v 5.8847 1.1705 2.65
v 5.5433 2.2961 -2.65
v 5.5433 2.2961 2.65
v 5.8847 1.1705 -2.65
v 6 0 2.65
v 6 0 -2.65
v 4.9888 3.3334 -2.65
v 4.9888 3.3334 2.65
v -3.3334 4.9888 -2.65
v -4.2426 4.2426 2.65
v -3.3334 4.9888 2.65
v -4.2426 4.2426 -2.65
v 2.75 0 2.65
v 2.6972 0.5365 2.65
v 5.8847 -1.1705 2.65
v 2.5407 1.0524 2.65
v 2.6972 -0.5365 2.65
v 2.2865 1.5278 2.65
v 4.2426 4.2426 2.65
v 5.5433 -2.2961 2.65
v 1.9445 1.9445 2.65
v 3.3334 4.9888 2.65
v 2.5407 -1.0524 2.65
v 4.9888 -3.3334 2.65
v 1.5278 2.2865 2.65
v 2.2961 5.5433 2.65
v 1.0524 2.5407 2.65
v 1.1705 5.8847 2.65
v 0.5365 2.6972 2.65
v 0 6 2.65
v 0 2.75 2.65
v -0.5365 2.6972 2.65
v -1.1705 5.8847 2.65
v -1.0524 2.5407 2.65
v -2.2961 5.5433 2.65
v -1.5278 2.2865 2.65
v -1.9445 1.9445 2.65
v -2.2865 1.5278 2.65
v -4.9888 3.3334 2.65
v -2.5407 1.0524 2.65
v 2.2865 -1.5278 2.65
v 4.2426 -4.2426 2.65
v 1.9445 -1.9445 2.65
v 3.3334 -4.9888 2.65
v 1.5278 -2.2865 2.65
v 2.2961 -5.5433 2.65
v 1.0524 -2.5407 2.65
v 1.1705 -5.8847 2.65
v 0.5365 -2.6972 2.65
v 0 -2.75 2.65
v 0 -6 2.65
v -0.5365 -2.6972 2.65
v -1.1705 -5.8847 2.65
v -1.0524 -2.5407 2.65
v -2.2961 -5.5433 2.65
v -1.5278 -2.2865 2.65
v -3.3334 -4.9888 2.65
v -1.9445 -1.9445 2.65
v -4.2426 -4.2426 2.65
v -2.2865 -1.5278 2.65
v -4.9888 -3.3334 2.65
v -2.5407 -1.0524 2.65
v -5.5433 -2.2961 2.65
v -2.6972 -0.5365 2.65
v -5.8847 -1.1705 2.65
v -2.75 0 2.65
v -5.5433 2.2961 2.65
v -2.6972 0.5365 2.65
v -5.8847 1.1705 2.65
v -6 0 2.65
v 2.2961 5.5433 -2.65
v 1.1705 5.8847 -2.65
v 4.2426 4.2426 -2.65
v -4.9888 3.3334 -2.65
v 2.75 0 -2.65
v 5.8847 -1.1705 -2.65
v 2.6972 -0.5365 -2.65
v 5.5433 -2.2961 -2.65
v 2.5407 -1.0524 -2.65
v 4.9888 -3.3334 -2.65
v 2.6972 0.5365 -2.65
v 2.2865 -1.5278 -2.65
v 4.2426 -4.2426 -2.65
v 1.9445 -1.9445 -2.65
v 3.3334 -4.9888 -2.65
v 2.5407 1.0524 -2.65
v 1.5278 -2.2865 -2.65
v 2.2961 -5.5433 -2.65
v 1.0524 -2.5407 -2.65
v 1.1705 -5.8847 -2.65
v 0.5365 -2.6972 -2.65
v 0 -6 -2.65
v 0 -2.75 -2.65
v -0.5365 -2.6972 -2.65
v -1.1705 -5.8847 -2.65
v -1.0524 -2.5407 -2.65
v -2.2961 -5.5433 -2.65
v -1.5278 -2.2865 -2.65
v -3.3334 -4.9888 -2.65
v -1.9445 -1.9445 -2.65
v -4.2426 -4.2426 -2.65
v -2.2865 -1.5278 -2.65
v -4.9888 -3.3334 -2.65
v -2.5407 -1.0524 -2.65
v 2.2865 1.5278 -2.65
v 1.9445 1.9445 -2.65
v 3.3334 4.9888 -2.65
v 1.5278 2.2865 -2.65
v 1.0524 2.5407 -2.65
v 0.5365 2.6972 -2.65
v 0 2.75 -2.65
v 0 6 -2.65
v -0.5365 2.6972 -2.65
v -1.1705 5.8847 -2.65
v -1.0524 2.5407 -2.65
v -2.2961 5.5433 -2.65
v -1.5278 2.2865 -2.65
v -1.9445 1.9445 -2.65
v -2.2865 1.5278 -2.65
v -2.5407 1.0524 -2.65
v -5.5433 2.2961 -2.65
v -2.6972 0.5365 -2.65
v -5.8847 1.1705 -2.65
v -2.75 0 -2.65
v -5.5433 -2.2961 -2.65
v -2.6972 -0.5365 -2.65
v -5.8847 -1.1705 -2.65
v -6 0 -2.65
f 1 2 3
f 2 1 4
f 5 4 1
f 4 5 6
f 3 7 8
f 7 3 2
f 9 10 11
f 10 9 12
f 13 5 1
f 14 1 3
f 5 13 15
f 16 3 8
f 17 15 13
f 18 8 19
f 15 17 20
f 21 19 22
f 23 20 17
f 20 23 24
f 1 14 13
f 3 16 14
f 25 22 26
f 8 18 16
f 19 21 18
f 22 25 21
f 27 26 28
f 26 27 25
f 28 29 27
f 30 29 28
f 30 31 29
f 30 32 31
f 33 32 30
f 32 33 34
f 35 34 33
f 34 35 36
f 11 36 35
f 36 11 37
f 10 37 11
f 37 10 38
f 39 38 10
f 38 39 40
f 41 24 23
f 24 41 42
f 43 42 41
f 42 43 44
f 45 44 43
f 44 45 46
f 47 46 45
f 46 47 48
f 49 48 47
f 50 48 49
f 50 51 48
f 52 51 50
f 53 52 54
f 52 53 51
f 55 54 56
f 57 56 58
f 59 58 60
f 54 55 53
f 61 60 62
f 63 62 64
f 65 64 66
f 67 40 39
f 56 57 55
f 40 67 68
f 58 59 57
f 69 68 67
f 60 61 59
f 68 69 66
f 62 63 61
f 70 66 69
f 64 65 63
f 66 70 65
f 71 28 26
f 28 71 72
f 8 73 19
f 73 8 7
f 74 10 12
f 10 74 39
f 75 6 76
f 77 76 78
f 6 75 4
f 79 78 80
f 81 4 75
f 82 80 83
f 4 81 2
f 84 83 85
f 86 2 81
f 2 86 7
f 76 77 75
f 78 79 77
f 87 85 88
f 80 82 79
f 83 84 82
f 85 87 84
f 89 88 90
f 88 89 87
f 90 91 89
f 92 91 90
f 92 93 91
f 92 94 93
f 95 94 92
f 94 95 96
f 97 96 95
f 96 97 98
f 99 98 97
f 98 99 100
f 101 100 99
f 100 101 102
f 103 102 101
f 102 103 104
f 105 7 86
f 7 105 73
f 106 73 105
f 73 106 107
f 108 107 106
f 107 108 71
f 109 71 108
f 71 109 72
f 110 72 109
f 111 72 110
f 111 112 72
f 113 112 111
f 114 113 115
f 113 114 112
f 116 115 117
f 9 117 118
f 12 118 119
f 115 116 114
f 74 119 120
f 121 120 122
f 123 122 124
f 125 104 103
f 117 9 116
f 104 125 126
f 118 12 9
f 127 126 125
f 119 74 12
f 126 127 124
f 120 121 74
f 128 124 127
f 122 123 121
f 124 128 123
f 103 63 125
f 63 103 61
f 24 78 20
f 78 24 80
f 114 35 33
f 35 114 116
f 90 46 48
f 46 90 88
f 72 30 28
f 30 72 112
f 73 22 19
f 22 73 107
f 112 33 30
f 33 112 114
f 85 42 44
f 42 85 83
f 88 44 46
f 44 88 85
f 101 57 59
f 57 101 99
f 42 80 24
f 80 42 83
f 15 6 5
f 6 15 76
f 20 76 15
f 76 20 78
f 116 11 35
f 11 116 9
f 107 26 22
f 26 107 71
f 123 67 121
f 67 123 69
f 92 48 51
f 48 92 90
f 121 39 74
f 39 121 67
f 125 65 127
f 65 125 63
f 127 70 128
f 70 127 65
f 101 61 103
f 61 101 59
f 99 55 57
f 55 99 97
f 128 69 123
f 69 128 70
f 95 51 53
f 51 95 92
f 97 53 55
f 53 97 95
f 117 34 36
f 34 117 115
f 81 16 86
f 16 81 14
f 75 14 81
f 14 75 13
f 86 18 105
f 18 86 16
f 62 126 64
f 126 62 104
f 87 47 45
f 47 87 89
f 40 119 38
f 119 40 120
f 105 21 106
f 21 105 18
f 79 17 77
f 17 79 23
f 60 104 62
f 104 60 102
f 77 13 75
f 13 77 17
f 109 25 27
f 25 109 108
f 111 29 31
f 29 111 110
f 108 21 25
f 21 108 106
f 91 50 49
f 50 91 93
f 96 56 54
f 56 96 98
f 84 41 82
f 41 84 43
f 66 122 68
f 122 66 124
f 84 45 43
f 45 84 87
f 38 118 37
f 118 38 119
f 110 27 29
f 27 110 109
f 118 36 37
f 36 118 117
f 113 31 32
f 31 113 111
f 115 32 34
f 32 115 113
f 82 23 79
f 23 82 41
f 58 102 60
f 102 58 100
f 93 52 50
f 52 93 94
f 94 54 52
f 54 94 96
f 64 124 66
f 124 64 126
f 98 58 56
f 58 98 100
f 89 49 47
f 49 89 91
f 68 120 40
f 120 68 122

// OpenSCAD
$fn=32;

difference(){
    cylinder(d=12,h=5.3,center=true);
    cylinder(d=5.5,h=5.3,center=true);
}
